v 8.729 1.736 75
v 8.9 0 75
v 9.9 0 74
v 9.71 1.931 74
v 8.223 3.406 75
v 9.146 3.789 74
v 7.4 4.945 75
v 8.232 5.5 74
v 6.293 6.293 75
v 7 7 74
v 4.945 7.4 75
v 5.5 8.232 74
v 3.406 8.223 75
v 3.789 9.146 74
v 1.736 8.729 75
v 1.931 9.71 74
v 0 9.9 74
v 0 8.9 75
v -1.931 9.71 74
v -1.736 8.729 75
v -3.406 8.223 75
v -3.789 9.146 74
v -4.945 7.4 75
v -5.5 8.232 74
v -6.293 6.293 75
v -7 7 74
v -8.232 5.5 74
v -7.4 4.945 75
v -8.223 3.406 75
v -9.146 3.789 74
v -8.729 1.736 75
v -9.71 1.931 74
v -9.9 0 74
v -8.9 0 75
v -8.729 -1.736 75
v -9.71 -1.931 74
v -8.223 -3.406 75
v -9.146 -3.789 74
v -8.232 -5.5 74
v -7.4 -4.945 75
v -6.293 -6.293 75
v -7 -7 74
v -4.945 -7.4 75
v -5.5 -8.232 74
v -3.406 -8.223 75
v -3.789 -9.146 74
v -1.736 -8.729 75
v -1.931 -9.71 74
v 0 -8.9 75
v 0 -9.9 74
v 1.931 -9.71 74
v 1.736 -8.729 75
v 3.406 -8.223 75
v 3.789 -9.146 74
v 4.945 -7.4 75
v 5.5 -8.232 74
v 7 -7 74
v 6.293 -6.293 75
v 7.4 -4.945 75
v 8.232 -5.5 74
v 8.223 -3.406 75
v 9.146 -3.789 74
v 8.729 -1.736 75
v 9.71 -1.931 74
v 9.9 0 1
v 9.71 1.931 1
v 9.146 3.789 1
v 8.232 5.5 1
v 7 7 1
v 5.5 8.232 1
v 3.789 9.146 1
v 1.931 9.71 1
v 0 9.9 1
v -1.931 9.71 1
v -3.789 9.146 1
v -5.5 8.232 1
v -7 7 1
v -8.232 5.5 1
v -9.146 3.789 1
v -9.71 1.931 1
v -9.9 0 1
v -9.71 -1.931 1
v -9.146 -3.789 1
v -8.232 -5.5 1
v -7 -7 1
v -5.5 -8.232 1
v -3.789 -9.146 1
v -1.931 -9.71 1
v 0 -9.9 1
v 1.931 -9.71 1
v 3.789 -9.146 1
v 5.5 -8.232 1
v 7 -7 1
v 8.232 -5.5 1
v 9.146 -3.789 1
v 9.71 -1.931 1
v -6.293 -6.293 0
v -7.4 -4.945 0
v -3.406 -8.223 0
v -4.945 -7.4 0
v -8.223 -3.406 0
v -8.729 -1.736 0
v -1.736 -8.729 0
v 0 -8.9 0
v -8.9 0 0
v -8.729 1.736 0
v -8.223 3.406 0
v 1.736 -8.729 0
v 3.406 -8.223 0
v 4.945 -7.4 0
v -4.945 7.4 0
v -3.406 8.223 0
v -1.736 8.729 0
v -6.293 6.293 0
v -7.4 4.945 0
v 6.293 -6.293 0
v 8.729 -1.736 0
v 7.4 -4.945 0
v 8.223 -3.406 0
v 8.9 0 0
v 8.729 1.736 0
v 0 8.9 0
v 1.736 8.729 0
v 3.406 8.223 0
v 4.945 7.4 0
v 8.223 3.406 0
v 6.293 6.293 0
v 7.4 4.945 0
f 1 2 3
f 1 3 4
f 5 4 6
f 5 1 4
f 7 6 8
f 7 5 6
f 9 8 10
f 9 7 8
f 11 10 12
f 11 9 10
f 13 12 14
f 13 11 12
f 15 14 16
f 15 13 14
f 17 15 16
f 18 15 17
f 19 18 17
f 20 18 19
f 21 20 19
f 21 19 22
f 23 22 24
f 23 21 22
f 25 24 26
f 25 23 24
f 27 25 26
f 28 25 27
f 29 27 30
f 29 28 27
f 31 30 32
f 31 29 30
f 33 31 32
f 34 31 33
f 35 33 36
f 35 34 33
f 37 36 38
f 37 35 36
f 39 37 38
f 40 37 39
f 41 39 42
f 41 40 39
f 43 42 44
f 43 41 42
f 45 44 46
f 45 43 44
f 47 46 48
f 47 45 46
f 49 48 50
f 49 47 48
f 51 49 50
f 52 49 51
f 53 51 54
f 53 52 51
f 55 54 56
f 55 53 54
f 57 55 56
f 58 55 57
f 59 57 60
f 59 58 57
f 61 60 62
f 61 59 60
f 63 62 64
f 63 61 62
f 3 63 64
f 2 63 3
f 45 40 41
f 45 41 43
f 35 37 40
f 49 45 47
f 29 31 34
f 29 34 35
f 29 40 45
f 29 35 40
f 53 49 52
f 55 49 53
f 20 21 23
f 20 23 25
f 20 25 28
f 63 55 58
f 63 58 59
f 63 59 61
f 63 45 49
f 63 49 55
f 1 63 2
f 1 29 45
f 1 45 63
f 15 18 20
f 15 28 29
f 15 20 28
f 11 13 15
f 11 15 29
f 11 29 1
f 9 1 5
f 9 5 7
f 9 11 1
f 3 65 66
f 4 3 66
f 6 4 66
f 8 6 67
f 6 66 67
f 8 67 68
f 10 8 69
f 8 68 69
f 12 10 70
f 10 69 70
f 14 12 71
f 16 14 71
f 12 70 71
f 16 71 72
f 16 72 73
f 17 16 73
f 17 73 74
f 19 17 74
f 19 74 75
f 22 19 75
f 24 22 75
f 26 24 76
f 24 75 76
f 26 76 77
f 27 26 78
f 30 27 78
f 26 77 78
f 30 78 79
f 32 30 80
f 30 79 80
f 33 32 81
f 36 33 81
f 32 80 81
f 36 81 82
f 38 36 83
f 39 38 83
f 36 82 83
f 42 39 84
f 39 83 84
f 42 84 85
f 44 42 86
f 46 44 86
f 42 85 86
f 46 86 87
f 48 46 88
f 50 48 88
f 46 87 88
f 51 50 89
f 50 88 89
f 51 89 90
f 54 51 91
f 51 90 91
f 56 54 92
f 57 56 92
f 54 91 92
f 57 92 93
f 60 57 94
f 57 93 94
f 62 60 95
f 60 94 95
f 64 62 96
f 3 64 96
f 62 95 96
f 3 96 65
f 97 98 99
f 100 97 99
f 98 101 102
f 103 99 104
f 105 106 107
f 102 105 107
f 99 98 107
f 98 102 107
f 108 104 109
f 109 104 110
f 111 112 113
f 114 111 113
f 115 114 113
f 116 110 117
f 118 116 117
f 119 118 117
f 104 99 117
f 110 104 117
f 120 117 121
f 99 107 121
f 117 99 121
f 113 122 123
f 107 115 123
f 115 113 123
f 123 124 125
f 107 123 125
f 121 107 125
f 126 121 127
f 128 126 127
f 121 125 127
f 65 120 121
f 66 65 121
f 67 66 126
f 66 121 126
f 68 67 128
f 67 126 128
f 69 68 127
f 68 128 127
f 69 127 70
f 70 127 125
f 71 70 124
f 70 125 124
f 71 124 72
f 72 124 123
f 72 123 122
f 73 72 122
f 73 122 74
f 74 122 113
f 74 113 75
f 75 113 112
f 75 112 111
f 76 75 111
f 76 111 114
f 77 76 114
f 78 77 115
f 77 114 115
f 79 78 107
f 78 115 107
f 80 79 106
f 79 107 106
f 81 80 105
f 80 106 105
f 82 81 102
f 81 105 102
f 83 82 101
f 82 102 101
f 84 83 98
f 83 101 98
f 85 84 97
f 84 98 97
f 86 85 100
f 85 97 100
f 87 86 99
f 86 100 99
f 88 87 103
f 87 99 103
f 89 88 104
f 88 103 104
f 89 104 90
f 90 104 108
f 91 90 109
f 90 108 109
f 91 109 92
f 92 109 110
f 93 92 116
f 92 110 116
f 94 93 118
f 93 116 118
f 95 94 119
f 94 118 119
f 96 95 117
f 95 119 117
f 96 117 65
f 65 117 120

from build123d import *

# Parameters (mm, degrees)
SKETCH1_R           = 9.9
BOSS_EXTRUDE1_DEPTH = 75
CHAMFER1_SIZE       = 1
CHAMFER2_SIZE       = 1


with BuildPart() as part:
    # Sketch1 → Boss-Extrude1 (new body)
    with BuildSketch(Plane.XY):
        Circle(SKETCH1_R)
    extrude(amount=BOSS_EXTRUDE1_DEPTH)

    # Chamfer1
    chamfer1_edges = [part.edges().sort_by_distance(p)[0] for p in [
        (-9.9, 0, 0),
    ]]
    chamfer(chamfer1_edges, length=CHAMFER1_SIZE)

    # Chamfer2
    chamfer2_edges = [part.edges().sort_by_distance(p)[0] for p in [
        (-9.9, 0, 75),
    ]]
    chamfer(chamfer2_edges, length=CHAMFER2_SIZE)


solid = part.part
